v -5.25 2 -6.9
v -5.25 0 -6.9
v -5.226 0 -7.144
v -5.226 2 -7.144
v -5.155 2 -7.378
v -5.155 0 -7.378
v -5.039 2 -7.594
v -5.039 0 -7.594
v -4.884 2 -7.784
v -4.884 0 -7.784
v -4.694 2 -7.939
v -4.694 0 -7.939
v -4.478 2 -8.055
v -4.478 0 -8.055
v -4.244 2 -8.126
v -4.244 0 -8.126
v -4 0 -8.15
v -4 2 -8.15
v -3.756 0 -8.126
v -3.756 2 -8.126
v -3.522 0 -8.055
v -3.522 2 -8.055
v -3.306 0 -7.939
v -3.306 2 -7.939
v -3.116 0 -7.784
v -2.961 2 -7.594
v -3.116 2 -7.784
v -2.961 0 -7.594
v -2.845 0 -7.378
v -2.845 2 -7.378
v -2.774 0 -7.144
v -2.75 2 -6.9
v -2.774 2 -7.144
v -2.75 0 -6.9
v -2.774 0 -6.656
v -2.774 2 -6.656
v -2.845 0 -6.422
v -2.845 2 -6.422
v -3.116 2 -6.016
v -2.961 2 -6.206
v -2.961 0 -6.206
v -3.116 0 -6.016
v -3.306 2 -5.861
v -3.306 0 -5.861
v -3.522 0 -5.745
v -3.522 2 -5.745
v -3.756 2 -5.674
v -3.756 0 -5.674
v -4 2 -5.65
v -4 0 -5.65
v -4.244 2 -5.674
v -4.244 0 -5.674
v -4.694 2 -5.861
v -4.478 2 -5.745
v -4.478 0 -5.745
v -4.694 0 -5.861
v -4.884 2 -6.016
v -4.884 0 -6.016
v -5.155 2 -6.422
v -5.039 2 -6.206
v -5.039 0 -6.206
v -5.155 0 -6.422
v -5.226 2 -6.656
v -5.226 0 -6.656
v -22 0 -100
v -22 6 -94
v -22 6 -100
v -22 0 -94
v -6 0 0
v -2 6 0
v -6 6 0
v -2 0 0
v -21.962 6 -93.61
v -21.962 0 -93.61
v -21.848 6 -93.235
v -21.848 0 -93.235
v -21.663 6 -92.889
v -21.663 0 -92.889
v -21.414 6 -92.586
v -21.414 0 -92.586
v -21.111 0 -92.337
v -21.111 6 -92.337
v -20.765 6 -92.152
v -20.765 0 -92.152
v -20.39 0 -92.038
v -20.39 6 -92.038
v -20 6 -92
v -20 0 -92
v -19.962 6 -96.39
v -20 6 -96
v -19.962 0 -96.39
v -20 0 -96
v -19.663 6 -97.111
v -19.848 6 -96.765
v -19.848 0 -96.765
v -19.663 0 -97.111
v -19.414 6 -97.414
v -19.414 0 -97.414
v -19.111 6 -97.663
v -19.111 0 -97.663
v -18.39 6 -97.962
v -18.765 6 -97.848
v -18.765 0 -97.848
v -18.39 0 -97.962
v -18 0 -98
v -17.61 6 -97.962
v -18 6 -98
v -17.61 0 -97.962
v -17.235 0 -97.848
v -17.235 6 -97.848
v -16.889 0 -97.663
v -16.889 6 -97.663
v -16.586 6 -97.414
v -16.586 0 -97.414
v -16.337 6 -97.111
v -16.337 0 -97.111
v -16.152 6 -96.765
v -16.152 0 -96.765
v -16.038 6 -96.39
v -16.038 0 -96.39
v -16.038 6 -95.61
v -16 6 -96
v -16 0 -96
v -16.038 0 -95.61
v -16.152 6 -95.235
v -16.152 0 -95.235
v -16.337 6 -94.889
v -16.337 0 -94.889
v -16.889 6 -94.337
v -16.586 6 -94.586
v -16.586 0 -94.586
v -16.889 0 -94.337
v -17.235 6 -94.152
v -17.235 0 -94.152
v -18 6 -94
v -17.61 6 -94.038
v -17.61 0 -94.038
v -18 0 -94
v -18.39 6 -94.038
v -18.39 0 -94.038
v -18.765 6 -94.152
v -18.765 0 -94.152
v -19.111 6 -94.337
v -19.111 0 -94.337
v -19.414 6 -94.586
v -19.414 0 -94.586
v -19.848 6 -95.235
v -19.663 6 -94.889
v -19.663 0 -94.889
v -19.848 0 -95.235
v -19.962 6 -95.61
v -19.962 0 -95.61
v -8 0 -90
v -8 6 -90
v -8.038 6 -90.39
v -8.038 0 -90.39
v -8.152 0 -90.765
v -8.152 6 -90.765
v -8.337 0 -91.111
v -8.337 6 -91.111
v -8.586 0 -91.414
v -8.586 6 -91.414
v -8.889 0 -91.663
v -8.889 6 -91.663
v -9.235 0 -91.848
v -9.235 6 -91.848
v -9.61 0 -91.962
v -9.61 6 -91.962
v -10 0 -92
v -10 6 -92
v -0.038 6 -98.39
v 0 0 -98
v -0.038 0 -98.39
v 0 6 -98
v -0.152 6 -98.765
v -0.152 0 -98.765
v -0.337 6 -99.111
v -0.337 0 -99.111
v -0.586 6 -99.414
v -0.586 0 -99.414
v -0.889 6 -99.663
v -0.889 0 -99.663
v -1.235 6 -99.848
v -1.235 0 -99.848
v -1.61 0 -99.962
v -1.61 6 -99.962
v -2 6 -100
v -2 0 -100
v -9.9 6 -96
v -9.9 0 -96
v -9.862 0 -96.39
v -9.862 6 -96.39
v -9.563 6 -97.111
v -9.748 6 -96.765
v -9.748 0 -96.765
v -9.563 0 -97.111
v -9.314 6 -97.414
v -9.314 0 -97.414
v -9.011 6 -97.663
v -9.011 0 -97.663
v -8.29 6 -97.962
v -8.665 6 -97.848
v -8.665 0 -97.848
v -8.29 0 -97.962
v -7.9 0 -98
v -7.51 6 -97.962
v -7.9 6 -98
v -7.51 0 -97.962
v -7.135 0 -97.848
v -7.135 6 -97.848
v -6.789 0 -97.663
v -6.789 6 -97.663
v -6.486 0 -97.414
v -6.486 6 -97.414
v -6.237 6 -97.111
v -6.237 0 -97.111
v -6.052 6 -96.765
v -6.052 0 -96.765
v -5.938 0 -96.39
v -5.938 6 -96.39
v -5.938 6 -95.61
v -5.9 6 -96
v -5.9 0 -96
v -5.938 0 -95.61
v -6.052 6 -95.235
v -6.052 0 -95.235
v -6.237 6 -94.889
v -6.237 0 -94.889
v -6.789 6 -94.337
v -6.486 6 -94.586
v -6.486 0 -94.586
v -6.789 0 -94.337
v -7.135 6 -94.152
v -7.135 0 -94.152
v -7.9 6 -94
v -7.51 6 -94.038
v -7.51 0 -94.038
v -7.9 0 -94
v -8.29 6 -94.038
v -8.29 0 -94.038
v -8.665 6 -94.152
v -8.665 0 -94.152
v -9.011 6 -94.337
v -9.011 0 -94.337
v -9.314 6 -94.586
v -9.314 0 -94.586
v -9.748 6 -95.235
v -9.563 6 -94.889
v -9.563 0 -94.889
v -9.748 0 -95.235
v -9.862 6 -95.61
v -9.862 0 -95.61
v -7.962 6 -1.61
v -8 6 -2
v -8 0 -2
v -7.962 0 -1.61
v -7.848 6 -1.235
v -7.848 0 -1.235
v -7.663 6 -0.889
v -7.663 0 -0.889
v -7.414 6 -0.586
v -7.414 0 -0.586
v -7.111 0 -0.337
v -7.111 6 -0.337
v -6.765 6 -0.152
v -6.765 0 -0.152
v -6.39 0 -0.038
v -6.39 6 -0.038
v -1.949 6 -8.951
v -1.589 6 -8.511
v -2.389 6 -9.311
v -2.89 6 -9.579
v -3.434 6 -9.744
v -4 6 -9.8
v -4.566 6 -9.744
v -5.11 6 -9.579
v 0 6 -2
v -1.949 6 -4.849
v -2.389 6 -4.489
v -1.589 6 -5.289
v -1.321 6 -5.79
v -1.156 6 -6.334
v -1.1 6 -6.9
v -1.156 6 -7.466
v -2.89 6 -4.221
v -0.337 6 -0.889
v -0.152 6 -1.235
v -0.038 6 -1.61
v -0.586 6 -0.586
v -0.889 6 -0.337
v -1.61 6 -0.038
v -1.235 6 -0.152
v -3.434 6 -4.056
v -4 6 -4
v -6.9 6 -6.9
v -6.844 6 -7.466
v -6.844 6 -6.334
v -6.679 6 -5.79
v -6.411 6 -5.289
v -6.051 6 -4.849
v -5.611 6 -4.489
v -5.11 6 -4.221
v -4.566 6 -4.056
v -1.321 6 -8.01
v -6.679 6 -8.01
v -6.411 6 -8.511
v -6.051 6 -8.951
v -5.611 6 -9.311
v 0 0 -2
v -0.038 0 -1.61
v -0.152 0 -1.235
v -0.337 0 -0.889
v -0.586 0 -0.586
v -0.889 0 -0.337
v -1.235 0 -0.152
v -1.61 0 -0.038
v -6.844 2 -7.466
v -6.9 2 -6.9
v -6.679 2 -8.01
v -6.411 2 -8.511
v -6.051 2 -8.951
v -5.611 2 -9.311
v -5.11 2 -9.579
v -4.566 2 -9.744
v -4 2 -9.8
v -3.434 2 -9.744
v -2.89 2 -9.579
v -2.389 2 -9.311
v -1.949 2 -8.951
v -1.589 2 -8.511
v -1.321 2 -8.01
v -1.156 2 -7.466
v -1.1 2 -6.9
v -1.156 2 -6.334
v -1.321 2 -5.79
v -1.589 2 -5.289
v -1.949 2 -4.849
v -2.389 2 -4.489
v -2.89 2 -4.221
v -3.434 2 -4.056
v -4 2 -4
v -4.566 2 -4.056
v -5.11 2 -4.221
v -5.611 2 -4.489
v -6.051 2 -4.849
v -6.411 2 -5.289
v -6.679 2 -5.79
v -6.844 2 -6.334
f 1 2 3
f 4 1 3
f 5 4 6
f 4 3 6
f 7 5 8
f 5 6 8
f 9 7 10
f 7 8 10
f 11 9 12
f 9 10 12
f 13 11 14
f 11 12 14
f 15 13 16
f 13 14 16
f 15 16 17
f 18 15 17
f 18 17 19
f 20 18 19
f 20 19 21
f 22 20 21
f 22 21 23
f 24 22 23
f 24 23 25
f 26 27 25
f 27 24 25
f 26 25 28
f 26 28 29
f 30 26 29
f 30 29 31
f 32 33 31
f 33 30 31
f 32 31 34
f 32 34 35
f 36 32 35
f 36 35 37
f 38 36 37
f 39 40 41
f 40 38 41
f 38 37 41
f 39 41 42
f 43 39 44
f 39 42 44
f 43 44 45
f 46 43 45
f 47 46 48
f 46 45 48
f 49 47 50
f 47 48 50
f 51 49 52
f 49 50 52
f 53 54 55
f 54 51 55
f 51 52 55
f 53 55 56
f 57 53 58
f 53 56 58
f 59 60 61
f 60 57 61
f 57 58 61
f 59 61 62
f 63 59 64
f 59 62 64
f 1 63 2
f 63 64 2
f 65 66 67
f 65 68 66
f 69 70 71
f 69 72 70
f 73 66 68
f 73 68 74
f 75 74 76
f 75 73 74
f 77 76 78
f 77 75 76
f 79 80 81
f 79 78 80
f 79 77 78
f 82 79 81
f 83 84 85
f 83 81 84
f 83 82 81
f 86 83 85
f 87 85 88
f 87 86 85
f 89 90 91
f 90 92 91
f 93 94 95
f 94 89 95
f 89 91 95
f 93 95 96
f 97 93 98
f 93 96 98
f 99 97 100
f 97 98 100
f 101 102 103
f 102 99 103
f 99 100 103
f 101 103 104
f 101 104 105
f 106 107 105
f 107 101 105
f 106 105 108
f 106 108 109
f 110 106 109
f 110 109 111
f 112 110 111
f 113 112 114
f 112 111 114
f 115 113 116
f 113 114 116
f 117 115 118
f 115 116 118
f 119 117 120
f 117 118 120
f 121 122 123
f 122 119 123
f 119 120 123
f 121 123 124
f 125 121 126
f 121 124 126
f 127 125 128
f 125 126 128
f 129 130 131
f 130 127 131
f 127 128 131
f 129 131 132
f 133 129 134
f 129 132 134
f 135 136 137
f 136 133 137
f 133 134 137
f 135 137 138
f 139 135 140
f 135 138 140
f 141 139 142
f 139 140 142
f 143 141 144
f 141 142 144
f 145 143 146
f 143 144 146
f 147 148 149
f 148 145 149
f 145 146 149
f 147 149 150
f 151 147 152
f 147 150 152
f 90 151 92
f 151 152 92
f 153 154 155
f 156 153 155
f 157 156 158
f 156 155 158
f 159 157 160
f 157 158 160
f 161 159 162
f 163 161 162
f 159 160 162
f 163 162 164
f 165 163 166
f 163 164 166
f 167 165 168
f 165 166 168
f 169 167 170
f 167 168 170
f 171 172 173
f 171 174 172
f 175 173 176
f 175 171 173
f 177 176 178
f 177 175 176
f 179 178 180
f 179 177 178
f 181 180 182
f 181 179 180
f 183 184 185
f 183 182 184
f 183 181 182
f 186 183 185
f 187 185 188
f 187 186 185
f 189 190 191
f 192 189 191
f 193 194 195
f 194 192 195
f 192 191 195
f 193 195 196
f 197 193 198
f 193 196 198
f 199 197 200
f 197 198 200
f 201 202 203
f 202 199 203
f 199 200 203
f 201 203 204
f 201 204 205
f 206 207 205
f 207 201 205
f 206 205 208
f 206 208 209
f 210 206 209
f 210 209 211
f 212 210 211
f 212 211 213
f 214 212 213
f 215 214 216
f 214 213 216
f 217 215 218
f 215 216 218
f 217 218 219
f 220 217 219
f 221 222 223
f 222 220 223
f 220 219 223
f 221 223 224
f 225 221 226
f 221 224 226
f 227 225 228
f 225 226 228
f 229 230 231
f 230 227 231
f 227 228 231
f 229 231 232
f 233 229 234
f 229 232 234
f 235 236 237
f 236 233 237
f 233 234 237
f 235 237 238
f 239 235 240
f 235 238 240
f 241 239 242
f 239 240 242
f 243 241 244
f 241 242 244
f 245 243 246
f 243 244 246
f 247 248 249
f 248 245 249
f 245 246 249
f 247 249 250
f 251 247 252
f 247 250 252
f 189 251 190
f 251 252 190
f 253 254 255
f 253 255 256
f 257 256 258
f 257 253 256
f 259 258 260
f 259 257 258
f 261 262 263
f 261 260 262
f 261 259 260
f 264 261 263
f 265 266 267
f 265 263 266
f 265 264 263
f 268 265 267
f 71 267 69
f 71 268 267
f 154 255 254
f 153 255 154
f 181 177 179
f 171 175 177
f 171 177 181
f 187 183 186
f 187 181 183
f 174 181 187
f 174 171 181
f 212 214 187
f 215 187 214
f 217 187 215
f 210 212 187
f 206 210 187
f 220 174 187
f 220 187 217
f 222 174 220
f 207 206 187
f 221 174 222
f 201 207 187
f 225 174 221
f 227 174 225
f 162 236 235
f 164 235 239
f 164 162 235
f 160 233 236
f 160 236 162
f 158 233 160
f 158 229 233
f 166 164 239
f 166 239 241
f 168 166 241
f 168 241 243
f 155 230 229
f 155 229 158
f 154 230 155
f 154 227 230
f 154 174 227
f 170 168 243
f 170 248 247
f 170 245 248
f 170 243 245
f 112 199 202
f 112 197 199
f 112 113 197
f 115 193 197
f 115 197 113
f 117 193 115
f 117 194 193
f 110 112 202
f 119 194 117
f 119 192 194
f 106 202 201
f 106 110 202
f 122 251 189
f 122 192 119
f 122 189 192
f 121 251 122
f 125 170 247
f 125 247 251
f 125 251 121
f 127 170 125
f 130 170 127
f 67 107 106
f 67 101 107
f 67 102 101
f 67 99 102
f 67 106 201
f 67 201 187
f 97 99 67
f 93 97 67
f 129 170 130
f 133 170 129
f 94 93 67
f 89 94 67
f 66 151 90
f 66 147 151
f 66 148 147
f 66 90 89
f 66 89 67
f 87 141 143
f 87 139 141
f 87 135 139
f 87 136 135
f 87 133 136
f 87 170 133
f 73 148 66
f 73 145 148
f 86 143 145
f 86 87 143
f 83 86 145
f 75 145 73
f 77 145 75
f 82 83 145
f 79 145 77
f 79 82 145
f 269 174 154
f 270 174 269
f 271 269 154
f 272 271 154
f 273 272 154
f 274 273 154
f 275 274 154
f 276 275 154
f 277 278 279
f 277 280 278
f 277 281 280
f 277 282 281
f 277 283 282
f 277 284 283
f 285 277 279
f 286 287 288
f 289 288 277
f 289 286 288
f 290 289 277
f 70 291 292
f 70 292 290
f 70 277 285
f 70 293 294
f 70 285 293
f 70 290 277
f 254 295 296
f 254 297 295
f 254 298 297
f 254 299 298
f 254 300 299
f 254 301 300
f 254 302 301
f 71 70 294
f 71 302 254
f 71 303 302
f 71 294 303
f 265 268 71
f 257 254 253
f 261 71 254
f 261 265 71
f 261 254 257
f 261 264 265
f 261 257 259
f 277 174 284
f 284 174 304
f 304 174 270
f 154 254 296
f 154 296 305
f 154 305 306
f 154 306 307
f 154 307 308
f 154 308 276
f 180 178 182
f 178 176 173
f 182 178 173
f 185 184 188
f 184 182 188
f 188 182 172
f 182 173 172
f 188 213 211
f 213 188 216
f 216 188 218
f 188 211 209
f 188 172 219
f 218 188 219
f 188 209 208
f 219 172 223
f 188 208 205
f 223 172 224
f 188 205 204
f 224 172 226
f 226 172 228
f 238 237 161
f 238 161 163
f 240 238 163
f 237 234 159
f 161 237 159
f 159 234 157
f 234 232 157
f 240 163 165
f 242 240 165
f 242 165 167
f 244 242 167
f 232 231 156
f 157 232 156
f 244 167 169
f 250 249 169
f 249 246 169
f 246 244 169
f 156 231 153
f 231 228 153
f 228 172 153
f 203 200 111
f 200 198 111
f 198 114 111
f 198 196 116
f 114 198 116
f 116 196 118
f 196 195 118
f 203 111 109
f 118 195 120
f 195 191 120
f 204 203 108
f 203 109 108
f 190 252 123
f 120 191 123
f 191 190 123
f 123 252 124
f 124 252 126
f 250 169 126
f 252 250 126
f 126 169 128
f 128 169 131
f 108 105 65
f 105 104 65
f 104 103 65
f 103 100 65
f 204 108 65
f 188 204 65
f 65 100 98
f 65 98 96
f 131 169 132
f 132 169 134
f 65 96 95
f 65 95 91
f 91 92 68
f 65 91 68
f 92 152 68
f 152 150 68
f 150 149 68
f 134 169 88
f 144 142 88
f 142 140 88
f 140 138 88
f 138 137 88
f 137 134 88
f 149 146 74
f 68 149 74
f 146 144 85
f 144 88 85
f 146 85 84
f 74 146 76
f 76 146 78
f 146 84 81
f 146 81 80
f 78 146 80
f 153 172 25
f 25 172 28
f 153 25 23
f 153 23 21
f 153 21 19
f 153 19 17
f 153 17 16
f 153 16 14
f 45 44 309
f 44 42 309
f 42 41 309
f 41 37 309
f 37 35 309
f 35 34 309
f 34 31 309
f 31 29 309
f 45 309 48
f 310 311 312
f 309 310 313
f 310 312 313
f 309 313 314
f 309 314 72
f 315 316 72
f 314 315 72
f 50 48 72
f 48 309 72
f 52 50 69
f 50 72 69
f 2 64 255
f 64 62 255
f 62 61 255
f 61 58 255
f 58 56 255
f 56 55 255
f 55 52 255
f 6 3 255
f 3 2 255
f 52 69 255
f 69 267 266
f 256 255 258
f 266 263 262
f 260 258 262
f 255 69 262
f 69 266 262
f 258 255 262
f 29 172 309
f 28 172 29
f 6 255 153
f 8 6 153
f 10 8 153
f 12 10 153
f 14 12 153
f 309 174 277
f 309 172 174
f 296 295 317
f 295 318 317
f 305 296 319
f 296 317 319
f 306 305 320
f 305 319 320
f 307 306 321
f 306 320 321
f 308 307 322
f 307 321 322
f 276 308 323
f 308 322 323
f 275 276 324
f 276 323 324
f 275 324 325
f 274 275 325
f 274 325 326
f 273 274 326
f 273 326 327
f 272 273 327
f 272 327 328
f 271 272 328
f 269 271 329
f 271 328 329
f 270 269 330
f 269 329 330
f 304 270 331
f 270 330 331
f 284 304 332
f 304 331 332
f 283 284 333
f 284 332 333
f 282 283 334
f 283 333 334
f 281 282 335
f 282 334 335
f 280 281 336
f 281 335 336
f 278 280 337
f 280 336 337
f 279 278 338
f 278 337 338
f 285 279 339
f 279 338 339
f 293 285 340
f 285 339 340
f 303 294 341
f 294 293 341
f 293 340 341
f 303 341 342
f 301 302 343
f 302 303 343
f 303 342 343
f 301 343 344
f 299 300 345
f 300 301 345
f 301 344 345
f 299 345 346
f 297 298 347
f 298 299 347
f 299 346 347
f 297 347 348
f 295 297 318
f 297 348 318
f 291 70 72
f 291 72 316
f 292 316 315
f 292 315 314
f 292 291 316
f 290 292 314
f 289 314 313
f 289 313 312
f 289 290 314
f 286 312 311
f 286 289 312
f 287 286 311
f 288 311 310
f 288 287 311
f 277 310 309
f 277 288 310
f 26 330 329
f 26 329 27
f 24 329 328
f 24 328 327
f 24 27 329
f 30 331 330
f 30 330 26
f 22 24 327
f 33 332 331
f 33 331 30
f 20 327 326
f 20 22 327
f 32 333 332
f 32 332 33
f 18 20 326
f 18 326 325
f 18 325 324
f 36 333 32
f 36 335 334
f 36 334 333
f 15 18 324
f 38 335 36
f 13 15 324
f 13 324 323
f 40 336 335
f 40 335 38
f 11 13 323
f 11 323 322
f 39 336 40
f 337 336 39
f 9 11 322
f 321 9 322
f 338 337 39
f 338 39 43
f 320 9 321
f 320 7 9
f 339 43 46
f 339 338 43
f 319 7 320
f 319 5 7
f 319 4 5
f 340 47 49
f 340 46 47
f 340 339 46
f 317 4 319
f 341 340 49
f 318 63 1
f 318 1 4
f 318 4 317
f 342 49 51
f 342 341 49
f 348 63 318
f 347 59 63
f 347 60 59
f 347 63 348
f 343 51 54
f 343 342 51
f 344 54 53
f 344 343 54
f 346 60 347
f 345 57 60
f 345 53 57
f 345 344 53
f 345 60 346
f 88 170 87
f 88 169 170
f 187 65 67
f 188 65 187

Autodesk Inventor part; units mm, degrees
ref_plane "YZ Plane" through (0, 0, 0) normal (1, 0, 0) x (0, 1, 0)
ref_plane "XZ Plane" through (0, 0, 0) normal (0, 1, 0) x (-1, 0, 0)
ref_plane "XY Plane" through (0, 0, 0) normal (0, 0, 1) x (1, 0, 0)
sketch "Esquisse1" plane through (0, 0, 0) normal (0, 1, 0) x (-1, 0, 0)
  line L0 (0, 0) -> (8, 0)
  line L1 (8, -100) -> (0, -100)
  line L2 (0, -100) -> (0, 0)
  line L3 (8, 0) -> (8, -92)
  line L4 (8, -92) -> (22, -92)
  line L5 (22, -92) -> (22, -100)
  line L6 (22, -100) -> (8, -100)
  circle A0 centre (18, -96) radius 2
  circle A1 centre (7.9, -96) radius 2
  circle A2 centre (4, -6.9) radius 2.9
  circle A3 centre (4, -6.9) radius 1.25
  dimension "d0" = 8
  dimension "d1" = 100
  dimension "d2" = 8
  dimension "d5" = 10.1
  dimension "d6" = 4
  dimension "d7" = 4
  dimension "d8" = 4
  dimension "d9" = 4
  dimension "d10" = 22
  dimension "d11" = 5.8
  dimension "d12" = 4
  dimension "d13" = 4
  dimension "d15" = 4
  dimension "d17" = 2.5
extrude "Extrusion1" add sketch "Esquisse1" along normal blind 6 contours L0 L3 L4 L5 L6 L1 L2
fillet "Congé1" radius 2 5 edges at (-8, 3, 0) (0, 3, 0) (-8, 3, -92) (0, 3, -100) (-22, 3, -92)
extrude "Extrusion2" add sketch "Esquisse1" along normal blind 2 contours A2
equation "\"d2\" = d0"
equation "\"d7\" = d6"
equation "\"d8\" = 0.5 * d0"
equation "\"d12\" = d8"
equation "\"d13\" = 0.5 * d0"
properties part number "_Impression 3D"
